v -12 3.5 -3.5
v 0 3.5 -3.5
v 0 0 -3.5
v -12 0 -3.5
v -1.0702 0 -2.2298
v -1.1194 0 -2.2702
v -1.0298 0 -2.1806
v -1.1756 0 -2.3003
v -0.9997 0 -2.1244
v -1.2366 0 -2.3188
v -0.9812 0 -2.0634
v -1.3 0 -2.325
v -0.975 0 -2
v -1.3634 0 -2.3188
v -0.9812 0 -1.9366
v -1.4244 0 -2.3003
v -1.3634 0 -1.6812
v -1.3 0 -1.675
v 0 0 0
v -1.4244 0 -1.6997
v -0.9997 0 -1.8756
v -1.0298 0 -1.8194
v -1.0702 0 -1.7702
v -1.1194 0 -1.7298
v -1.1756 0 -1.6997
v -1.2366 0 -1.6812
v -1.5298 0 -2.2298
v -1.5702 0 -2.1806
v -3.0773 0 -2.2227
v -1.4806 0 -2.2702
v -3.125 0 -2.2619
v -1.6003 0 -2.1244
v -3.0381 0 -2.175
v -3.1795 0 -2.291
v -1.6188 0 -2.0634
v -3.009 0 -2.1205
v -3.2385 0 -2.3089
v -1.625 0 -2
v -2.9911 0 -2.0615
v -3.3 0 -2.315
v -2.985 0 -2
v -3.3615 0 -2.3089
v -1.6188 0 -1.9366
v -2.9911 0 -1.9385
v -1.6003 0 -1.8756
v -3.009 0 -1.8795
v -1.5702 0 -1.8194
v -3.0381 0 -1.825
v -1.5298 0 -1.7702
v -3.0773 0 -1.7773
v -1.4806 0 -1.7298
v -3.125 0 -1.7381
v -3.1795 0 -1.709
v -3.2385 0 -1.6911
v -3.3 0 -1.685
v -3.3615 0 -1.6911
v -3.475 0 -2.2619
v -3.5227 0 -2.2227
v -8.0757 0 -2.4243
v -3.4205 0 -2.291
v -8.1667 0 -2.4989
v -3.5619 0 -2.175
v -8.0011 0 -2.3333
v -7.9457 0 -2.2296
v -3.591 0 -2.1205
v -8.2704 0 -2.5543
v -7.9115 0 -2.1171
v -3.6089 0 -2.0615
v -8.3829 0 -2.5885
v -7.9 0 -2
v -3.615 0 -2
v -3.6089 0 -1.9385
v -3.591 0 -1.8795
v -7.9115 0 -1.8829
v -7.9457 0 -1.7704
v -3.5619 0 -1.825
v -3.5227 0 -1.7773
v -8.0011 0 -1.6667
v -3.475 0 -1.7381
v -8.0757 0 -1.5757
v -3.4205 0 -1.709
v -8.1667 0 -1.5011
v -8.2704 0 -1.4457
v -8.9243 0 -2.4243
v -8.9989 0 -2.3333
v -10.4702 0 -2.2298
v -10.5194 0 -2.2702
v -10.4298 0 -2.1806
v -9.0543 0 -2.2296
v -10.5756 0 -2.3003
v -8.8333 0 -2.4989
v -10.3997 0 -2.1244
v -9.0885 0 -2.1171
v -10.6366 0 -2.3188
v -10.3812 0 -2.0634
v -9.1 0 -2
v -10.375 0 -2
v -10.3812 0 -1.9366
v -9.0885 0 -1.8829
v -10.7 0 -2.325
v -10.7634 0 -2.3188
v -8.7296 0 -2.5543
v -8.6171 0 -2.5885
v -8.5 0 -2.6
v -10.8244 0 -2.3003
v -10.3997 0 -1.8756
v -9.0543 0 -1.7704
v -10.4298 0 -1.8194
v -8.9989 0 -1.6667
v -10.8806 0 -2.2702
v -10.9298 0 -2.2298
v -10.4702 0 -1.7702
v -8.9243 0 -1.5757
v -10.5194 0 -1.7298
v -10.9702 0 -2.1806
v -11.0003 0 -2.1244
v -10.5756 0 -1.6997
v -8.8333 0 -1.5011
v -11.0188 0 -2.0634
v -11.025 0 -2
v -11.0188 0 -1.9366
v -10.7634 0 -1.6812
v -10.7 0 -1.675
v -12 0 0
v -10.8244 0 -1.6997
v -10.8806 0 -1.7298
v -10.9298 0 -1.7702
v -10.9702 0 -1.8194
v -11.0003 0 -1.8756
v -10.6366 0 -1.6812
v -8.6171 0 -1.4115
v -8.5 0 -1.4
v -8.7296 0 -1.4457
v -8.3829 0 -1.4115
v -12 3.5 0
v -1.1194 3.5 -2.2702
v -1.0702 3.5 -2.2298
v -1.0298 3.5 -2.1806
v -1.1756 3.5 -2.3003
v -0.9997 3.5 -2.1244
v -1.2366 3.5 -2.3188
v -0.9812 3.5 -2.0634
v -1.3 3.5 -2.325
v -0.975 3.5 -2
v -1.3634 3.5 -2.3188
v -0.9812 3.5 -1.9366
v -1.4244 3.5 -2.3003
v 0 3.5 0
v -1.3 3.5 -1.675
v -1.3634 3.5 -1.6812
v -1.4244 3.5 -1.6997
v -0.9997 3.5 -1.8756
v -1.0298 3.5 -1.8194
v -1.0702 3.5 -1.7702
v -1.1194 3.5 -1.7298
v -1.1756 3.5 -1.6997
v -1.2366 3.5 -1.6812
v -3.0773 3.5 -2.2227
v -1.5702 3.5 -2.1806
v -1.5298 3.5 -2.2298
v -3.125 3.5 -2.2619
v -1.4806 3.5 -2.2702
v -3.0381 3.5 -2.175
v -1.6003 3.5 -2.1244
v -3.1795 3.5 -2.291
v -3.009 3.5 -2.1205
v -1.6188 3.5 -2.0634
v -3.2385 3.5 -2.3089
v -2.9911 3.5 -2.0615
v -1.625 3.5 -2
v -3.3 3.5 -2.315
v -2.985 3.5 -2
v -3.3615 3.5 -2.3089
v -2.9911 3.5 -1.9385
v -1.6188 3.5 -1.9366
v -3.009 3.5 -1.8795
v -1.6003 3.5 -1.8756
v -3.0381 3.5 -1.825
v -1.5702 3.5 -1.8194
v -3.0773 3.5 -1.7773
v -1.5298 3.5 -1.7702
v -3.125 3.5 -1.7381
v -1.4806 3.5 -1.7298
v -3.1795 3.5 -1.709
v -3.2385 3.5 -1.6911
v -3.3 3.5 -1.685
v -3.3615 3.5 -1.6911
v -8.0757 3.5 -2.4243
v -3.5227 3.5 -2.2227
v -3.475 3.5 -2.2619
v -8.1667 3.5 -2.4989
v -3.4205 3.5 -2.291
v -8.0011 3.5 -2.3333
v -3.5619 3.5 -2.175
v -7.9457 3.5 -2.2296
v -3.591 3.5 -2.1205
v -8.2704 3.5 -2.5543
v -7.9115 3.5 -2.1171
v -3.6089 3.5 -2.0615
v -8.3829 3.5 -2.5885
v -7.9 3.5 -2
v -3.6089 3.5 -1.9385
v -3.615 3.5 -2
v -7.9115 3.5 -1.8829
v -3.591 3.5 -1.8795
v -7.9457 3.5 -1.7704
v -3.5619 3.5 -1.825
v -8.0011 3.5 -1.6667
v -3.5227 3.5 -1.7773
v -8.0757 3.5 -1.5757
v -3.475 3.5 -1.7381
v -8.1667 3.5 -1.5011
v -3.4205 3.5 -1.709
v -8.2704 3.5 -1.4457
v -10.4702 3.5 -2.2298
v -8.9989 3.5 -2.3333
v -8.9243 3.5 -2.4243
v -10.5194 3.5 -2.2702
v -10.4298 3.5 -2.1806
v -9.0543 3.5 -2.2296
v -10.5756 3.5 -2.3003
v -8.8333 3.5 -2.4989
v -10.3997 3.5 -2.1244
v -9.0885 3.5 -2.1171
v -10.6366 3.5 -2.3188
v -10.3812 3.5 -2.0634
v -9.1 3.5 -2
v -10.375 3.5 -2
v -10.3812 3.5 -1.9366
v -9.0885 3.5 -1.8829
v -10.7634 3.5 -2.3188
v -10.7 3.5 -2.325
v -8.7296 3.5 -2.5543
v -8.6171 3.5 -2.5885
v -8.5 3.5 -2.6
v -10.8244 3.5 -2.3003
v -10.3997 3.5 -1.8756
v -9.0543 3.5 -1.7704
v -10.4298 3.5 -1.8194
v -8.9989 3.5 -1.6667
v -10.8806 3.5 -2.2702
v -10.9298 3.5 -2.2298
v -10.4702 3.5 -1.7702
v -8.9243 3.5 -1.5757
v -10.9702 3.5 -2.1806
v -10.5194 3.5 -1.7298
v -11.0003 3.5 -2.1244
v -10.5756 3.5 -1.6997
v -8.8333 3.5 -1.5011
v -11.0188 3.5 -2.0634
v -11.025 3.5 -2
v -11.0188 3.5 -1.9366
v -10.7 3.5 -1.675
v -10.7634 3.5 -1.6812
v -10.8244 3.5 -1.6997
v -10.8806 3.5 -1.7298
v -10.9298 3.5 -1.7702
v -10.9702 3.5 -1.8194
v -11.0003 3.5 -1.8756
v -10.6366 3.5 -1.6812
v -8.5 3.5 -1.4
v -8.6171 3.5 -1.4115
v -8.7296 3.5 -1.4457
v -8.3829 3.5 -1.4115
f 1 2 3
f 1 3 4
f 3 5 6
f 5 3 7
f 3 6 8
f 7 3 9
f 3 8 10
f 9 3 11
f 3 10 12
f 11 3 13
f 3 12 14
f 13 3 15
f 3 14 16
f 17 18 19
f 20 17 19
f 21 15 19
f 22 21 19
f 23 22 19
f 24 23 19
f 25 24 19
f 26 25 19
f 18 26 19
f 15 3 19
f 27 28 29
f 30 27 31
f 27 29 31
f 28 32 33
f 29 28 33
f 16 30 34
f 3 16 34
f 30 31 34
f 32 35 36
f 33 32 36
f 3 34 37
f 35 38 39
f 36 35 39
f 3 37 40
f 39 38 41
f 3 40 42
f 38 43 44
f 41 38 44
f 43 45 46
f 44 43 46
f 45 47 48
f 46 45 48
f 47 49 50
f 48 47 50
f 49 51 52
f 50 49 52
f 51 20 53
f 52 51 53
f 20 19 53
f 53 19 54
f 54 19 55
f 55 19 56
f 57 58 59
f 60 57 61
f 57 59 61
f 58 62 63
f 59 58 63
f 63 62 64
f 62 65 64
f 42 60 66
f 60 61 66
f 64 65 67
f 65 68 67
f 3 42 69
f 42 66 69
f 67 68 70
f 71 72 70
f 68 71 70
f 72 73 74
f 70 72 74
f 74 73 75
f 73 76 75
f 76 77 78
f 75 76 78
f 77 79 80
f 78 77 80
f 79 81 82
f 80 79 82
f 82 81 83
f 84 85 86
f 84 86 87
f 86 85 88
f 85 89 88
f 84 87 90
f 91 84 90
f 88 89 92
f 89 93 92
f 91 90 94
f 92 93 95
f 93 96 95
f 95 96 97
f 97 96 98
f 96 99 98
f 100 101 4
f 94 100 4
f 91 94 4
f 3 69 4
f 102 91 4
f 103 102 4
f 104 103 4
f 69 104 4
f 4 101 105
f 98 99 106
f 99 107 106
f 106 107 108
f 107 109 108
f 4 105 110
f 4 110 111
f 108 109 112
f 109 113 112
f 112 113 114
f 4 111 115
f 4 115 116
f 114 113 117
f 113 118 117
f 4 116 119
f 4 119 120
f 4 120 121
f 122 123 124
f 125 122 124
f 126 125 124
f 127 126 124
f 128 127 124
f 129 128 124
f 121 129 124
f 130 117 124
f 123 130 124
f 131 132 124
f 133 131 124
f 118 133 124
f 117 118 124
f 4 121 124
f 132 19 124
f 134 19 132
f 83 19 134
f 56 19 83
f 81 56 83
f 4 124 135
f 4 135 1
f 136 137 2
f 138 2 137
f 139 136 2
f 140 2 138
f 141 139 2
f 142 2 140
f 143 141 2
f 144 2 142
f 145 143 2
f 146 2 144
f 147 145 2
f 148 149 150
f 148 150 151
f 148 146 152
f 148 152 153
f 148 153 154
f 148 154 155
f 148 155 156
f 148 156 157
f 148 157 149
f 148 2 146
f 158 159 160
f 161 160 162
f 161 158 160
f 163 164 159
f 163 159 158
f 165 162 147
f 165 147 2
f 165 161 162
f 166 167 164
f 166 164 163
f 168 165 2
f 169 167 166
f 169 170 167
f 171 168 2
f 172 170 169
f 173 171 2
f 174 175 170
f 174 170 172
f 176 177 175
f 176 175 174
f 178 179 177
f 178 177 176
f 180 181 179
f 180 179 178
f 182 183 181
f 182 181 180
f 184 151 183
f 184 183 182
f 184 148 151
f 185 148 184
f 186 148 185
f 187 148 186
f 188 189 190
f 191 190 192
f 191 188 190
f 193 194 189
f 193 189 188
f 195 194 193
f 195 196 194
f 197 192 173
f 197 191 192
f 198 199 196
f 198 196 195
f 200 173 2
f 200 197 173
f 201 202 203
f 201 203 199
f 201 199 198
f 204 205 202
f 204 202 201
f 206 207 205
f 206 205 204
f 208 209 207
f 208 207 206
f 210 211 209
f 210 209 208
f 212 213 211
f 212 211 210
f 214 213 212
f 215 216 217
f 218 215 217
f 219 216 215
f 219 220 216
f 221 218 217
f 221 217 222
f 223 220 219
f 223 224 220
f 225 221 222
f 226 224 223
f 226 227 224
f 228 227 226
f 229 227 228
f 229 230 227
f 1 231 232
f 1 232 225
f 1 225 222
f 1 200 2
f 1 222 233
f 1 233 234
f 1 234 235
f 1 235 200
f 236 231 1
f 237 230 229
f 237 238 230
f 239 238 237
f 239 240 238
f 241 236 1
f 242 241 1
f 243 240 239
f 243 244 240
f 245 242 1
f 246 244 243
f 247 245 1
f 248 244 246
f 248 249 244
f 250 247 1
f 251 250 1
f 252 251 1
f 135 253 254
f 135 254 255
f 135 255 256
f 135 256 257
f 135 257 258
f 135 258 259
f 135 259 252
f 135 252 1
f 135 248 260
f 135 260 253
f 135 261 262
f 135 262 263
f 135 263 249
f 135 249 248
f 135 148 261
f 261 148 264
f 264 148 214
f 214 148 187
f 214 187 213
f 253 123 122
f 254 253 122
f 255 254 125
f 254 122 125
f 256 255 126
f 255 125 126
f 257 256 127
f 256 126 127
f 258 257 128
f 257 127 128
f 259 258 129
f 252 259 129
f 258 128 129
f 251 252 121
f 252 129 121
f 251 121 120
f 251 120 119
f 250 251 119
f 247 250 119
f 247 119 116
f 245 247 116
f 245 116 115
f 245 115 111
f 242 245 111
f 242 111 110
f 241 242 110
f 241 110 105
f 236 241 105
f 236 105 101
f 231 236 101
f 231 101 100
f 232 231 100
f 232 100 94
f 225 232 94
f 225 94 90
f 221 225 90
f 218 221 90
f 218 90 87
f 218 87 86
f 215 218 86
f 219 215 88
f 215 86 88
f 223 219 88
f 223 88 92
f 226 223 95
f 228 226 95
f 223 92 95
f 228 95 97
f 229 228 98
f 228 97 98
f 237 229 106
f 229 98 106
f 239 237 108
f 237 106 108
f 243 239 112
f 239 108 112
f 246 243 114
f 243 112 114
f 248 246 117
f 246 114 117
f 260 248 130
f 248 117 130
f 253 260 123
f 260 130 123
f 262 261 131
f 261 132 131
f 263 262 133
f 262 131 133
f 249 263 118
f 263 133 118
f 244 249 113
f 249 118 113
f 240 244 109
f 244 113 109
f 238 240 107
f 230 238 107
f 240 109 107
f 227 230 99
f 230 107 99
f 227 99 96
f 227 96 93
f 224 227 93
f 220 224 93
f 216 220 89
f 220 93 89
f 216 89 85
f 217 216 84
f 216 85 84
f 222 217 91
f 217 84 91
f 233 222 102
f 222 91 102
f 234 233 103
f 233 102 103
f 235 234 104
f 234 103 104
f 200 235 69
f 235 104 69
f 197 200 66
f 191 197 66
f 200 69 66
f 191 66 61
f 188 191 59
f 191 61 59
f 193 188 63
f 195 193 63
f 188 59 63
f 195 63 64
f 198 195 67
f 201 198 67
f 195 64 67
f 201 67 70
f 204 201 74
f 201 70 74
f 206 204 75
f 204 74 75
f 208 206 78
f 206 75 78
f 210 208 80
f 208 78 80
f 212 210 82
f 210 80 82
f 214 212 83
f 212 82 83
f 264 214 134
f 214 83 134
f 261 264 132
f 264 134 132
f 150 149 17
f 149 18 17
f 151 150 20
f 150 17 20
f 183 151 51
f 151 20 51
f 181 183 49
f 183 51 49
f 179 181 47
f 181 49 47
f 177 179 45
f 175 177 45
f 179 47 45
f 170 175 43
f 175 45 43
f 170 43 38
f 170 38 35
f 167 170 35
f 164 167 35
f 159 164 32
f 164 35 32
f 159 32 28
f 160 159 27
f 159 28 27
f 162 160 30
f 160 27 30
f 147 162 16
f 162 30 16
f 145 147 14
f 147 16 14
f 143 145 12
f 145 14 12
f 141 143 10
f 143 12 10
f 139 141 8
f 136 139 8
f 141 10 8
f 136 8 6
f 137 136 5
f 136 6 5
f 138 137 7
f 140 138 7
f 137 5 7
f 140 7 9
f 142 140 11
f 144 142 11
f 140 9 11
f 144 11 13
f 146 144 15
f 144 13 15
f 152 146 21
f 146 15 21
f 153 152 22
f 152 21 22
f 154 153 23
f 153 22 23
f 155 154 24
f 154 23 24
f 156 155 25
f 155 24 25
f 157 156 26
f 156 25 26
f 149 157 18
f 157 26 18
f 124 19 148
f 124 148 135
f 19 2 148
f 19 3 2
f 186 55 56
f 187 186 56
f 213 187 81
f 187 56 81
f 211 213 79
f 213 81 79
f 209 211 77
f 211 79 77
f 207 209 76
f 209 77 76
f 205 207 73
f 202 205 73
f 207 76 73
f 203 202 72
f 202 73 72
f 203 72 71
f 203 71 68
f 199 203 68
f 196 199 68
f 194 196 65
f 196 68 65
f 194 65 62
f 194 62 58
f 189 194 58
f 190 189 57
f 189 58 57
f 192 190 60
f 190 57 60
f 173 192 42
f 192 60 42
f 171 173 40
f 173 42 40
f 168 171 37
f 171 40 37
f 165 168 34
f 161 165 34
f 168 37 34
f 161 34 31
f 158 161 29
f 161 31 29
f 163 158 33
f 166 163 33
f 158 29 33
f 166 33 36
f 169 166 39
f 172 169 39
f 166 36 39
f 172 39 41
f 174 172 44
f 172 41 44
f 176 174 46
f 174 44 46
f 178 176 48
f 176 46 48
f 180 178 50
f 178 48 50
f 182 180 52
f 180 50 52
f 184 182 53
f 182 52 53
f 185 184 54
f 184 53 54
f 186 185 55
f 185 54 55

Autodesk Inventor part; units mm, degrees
ref_plane "YZ Plane" through (0, 0, 0) normal (1, 0, 0) x (0, 1, 0)
ref_plane "XZ Plane" through (0, 0, 0) normal (0, 1, 0) x (-1, 0, 0)
ref_plane "XY Plane" through (0, 0, 0) normal (0, 0, 1) x (1, 0, 0)
sketch "스케치1" plane through (0, 0, 0) normal (0, 1, 0) x (-1, 0, 0)
  line L0 (0, 0) -> (12, 0)
  line L1 (12, 0) -> (12, -4)
  line L2 (12, -4) -> (0, -4)
  line L3 (0, -4) -> (0, 0)
  dimension "d0" = 12
  dimension "d1" = 4
extrude "돌출1" add sketch "스케치1" along normal blind 3.5
sketch "스케치2" plane through (0, 3.5, 0) normal (0, 1, 0) x (1, 0, 0)
  line L0 (0, 0) -> (0, 4) construction
  line L1 (0, 2) -> (-12, 2) construction
  line L2 (-12, 4) -> (-12, 0) construction
  point P0 (-1.3, 2)
  point P1 (-3.3, 2)
  point P2 (-8.5, 2)
  point P3 (-10.7, 2)
  dimension "d59" = 1.3
  dimension "d60" = 2.2
  dimension "d61" = 5.2
  dimension "d62" = 1.3
  dimension "d72" = 2
hole "구멍1" at (-10.7, 3.5, -2) at (-1.3, 3.5, -2) direction (0, -1, 0) diameter 0.65 end through all
hole "구멍2" at (-8.5, 3.5, -2) direction (0, -1, 0) diameter 1.2 end through all
hole "구멍3" at (-3.3, 3.5, -2) direction (0, -1, 0) diameter 0.63 end through all
sketch "스케치7" plane through (0, 0, -4) normal (0, 0, -1) x (-1, 0, 0)
  line L0 (12, 0) -> (0, 0) projected
  line L1 (12, 0) -> (12, 3.5) projected
  line L2 (0, 3.5) -> (12, 3.5) projected
  line L3 (0, 0) -> (0, 3.5) projected
  point P0 (0, 0)
extrude "돌출5" cut sketch "스케치7" against normal blind 0.5
equation "\"G23_F\" = 0.65"
equation "\"G23_M\" = 0.67"
equation "\"Screw_F\" = 1.3"
equation "\"Screw_M\" = 1.6"
properties part number "_3D 인쇄"
